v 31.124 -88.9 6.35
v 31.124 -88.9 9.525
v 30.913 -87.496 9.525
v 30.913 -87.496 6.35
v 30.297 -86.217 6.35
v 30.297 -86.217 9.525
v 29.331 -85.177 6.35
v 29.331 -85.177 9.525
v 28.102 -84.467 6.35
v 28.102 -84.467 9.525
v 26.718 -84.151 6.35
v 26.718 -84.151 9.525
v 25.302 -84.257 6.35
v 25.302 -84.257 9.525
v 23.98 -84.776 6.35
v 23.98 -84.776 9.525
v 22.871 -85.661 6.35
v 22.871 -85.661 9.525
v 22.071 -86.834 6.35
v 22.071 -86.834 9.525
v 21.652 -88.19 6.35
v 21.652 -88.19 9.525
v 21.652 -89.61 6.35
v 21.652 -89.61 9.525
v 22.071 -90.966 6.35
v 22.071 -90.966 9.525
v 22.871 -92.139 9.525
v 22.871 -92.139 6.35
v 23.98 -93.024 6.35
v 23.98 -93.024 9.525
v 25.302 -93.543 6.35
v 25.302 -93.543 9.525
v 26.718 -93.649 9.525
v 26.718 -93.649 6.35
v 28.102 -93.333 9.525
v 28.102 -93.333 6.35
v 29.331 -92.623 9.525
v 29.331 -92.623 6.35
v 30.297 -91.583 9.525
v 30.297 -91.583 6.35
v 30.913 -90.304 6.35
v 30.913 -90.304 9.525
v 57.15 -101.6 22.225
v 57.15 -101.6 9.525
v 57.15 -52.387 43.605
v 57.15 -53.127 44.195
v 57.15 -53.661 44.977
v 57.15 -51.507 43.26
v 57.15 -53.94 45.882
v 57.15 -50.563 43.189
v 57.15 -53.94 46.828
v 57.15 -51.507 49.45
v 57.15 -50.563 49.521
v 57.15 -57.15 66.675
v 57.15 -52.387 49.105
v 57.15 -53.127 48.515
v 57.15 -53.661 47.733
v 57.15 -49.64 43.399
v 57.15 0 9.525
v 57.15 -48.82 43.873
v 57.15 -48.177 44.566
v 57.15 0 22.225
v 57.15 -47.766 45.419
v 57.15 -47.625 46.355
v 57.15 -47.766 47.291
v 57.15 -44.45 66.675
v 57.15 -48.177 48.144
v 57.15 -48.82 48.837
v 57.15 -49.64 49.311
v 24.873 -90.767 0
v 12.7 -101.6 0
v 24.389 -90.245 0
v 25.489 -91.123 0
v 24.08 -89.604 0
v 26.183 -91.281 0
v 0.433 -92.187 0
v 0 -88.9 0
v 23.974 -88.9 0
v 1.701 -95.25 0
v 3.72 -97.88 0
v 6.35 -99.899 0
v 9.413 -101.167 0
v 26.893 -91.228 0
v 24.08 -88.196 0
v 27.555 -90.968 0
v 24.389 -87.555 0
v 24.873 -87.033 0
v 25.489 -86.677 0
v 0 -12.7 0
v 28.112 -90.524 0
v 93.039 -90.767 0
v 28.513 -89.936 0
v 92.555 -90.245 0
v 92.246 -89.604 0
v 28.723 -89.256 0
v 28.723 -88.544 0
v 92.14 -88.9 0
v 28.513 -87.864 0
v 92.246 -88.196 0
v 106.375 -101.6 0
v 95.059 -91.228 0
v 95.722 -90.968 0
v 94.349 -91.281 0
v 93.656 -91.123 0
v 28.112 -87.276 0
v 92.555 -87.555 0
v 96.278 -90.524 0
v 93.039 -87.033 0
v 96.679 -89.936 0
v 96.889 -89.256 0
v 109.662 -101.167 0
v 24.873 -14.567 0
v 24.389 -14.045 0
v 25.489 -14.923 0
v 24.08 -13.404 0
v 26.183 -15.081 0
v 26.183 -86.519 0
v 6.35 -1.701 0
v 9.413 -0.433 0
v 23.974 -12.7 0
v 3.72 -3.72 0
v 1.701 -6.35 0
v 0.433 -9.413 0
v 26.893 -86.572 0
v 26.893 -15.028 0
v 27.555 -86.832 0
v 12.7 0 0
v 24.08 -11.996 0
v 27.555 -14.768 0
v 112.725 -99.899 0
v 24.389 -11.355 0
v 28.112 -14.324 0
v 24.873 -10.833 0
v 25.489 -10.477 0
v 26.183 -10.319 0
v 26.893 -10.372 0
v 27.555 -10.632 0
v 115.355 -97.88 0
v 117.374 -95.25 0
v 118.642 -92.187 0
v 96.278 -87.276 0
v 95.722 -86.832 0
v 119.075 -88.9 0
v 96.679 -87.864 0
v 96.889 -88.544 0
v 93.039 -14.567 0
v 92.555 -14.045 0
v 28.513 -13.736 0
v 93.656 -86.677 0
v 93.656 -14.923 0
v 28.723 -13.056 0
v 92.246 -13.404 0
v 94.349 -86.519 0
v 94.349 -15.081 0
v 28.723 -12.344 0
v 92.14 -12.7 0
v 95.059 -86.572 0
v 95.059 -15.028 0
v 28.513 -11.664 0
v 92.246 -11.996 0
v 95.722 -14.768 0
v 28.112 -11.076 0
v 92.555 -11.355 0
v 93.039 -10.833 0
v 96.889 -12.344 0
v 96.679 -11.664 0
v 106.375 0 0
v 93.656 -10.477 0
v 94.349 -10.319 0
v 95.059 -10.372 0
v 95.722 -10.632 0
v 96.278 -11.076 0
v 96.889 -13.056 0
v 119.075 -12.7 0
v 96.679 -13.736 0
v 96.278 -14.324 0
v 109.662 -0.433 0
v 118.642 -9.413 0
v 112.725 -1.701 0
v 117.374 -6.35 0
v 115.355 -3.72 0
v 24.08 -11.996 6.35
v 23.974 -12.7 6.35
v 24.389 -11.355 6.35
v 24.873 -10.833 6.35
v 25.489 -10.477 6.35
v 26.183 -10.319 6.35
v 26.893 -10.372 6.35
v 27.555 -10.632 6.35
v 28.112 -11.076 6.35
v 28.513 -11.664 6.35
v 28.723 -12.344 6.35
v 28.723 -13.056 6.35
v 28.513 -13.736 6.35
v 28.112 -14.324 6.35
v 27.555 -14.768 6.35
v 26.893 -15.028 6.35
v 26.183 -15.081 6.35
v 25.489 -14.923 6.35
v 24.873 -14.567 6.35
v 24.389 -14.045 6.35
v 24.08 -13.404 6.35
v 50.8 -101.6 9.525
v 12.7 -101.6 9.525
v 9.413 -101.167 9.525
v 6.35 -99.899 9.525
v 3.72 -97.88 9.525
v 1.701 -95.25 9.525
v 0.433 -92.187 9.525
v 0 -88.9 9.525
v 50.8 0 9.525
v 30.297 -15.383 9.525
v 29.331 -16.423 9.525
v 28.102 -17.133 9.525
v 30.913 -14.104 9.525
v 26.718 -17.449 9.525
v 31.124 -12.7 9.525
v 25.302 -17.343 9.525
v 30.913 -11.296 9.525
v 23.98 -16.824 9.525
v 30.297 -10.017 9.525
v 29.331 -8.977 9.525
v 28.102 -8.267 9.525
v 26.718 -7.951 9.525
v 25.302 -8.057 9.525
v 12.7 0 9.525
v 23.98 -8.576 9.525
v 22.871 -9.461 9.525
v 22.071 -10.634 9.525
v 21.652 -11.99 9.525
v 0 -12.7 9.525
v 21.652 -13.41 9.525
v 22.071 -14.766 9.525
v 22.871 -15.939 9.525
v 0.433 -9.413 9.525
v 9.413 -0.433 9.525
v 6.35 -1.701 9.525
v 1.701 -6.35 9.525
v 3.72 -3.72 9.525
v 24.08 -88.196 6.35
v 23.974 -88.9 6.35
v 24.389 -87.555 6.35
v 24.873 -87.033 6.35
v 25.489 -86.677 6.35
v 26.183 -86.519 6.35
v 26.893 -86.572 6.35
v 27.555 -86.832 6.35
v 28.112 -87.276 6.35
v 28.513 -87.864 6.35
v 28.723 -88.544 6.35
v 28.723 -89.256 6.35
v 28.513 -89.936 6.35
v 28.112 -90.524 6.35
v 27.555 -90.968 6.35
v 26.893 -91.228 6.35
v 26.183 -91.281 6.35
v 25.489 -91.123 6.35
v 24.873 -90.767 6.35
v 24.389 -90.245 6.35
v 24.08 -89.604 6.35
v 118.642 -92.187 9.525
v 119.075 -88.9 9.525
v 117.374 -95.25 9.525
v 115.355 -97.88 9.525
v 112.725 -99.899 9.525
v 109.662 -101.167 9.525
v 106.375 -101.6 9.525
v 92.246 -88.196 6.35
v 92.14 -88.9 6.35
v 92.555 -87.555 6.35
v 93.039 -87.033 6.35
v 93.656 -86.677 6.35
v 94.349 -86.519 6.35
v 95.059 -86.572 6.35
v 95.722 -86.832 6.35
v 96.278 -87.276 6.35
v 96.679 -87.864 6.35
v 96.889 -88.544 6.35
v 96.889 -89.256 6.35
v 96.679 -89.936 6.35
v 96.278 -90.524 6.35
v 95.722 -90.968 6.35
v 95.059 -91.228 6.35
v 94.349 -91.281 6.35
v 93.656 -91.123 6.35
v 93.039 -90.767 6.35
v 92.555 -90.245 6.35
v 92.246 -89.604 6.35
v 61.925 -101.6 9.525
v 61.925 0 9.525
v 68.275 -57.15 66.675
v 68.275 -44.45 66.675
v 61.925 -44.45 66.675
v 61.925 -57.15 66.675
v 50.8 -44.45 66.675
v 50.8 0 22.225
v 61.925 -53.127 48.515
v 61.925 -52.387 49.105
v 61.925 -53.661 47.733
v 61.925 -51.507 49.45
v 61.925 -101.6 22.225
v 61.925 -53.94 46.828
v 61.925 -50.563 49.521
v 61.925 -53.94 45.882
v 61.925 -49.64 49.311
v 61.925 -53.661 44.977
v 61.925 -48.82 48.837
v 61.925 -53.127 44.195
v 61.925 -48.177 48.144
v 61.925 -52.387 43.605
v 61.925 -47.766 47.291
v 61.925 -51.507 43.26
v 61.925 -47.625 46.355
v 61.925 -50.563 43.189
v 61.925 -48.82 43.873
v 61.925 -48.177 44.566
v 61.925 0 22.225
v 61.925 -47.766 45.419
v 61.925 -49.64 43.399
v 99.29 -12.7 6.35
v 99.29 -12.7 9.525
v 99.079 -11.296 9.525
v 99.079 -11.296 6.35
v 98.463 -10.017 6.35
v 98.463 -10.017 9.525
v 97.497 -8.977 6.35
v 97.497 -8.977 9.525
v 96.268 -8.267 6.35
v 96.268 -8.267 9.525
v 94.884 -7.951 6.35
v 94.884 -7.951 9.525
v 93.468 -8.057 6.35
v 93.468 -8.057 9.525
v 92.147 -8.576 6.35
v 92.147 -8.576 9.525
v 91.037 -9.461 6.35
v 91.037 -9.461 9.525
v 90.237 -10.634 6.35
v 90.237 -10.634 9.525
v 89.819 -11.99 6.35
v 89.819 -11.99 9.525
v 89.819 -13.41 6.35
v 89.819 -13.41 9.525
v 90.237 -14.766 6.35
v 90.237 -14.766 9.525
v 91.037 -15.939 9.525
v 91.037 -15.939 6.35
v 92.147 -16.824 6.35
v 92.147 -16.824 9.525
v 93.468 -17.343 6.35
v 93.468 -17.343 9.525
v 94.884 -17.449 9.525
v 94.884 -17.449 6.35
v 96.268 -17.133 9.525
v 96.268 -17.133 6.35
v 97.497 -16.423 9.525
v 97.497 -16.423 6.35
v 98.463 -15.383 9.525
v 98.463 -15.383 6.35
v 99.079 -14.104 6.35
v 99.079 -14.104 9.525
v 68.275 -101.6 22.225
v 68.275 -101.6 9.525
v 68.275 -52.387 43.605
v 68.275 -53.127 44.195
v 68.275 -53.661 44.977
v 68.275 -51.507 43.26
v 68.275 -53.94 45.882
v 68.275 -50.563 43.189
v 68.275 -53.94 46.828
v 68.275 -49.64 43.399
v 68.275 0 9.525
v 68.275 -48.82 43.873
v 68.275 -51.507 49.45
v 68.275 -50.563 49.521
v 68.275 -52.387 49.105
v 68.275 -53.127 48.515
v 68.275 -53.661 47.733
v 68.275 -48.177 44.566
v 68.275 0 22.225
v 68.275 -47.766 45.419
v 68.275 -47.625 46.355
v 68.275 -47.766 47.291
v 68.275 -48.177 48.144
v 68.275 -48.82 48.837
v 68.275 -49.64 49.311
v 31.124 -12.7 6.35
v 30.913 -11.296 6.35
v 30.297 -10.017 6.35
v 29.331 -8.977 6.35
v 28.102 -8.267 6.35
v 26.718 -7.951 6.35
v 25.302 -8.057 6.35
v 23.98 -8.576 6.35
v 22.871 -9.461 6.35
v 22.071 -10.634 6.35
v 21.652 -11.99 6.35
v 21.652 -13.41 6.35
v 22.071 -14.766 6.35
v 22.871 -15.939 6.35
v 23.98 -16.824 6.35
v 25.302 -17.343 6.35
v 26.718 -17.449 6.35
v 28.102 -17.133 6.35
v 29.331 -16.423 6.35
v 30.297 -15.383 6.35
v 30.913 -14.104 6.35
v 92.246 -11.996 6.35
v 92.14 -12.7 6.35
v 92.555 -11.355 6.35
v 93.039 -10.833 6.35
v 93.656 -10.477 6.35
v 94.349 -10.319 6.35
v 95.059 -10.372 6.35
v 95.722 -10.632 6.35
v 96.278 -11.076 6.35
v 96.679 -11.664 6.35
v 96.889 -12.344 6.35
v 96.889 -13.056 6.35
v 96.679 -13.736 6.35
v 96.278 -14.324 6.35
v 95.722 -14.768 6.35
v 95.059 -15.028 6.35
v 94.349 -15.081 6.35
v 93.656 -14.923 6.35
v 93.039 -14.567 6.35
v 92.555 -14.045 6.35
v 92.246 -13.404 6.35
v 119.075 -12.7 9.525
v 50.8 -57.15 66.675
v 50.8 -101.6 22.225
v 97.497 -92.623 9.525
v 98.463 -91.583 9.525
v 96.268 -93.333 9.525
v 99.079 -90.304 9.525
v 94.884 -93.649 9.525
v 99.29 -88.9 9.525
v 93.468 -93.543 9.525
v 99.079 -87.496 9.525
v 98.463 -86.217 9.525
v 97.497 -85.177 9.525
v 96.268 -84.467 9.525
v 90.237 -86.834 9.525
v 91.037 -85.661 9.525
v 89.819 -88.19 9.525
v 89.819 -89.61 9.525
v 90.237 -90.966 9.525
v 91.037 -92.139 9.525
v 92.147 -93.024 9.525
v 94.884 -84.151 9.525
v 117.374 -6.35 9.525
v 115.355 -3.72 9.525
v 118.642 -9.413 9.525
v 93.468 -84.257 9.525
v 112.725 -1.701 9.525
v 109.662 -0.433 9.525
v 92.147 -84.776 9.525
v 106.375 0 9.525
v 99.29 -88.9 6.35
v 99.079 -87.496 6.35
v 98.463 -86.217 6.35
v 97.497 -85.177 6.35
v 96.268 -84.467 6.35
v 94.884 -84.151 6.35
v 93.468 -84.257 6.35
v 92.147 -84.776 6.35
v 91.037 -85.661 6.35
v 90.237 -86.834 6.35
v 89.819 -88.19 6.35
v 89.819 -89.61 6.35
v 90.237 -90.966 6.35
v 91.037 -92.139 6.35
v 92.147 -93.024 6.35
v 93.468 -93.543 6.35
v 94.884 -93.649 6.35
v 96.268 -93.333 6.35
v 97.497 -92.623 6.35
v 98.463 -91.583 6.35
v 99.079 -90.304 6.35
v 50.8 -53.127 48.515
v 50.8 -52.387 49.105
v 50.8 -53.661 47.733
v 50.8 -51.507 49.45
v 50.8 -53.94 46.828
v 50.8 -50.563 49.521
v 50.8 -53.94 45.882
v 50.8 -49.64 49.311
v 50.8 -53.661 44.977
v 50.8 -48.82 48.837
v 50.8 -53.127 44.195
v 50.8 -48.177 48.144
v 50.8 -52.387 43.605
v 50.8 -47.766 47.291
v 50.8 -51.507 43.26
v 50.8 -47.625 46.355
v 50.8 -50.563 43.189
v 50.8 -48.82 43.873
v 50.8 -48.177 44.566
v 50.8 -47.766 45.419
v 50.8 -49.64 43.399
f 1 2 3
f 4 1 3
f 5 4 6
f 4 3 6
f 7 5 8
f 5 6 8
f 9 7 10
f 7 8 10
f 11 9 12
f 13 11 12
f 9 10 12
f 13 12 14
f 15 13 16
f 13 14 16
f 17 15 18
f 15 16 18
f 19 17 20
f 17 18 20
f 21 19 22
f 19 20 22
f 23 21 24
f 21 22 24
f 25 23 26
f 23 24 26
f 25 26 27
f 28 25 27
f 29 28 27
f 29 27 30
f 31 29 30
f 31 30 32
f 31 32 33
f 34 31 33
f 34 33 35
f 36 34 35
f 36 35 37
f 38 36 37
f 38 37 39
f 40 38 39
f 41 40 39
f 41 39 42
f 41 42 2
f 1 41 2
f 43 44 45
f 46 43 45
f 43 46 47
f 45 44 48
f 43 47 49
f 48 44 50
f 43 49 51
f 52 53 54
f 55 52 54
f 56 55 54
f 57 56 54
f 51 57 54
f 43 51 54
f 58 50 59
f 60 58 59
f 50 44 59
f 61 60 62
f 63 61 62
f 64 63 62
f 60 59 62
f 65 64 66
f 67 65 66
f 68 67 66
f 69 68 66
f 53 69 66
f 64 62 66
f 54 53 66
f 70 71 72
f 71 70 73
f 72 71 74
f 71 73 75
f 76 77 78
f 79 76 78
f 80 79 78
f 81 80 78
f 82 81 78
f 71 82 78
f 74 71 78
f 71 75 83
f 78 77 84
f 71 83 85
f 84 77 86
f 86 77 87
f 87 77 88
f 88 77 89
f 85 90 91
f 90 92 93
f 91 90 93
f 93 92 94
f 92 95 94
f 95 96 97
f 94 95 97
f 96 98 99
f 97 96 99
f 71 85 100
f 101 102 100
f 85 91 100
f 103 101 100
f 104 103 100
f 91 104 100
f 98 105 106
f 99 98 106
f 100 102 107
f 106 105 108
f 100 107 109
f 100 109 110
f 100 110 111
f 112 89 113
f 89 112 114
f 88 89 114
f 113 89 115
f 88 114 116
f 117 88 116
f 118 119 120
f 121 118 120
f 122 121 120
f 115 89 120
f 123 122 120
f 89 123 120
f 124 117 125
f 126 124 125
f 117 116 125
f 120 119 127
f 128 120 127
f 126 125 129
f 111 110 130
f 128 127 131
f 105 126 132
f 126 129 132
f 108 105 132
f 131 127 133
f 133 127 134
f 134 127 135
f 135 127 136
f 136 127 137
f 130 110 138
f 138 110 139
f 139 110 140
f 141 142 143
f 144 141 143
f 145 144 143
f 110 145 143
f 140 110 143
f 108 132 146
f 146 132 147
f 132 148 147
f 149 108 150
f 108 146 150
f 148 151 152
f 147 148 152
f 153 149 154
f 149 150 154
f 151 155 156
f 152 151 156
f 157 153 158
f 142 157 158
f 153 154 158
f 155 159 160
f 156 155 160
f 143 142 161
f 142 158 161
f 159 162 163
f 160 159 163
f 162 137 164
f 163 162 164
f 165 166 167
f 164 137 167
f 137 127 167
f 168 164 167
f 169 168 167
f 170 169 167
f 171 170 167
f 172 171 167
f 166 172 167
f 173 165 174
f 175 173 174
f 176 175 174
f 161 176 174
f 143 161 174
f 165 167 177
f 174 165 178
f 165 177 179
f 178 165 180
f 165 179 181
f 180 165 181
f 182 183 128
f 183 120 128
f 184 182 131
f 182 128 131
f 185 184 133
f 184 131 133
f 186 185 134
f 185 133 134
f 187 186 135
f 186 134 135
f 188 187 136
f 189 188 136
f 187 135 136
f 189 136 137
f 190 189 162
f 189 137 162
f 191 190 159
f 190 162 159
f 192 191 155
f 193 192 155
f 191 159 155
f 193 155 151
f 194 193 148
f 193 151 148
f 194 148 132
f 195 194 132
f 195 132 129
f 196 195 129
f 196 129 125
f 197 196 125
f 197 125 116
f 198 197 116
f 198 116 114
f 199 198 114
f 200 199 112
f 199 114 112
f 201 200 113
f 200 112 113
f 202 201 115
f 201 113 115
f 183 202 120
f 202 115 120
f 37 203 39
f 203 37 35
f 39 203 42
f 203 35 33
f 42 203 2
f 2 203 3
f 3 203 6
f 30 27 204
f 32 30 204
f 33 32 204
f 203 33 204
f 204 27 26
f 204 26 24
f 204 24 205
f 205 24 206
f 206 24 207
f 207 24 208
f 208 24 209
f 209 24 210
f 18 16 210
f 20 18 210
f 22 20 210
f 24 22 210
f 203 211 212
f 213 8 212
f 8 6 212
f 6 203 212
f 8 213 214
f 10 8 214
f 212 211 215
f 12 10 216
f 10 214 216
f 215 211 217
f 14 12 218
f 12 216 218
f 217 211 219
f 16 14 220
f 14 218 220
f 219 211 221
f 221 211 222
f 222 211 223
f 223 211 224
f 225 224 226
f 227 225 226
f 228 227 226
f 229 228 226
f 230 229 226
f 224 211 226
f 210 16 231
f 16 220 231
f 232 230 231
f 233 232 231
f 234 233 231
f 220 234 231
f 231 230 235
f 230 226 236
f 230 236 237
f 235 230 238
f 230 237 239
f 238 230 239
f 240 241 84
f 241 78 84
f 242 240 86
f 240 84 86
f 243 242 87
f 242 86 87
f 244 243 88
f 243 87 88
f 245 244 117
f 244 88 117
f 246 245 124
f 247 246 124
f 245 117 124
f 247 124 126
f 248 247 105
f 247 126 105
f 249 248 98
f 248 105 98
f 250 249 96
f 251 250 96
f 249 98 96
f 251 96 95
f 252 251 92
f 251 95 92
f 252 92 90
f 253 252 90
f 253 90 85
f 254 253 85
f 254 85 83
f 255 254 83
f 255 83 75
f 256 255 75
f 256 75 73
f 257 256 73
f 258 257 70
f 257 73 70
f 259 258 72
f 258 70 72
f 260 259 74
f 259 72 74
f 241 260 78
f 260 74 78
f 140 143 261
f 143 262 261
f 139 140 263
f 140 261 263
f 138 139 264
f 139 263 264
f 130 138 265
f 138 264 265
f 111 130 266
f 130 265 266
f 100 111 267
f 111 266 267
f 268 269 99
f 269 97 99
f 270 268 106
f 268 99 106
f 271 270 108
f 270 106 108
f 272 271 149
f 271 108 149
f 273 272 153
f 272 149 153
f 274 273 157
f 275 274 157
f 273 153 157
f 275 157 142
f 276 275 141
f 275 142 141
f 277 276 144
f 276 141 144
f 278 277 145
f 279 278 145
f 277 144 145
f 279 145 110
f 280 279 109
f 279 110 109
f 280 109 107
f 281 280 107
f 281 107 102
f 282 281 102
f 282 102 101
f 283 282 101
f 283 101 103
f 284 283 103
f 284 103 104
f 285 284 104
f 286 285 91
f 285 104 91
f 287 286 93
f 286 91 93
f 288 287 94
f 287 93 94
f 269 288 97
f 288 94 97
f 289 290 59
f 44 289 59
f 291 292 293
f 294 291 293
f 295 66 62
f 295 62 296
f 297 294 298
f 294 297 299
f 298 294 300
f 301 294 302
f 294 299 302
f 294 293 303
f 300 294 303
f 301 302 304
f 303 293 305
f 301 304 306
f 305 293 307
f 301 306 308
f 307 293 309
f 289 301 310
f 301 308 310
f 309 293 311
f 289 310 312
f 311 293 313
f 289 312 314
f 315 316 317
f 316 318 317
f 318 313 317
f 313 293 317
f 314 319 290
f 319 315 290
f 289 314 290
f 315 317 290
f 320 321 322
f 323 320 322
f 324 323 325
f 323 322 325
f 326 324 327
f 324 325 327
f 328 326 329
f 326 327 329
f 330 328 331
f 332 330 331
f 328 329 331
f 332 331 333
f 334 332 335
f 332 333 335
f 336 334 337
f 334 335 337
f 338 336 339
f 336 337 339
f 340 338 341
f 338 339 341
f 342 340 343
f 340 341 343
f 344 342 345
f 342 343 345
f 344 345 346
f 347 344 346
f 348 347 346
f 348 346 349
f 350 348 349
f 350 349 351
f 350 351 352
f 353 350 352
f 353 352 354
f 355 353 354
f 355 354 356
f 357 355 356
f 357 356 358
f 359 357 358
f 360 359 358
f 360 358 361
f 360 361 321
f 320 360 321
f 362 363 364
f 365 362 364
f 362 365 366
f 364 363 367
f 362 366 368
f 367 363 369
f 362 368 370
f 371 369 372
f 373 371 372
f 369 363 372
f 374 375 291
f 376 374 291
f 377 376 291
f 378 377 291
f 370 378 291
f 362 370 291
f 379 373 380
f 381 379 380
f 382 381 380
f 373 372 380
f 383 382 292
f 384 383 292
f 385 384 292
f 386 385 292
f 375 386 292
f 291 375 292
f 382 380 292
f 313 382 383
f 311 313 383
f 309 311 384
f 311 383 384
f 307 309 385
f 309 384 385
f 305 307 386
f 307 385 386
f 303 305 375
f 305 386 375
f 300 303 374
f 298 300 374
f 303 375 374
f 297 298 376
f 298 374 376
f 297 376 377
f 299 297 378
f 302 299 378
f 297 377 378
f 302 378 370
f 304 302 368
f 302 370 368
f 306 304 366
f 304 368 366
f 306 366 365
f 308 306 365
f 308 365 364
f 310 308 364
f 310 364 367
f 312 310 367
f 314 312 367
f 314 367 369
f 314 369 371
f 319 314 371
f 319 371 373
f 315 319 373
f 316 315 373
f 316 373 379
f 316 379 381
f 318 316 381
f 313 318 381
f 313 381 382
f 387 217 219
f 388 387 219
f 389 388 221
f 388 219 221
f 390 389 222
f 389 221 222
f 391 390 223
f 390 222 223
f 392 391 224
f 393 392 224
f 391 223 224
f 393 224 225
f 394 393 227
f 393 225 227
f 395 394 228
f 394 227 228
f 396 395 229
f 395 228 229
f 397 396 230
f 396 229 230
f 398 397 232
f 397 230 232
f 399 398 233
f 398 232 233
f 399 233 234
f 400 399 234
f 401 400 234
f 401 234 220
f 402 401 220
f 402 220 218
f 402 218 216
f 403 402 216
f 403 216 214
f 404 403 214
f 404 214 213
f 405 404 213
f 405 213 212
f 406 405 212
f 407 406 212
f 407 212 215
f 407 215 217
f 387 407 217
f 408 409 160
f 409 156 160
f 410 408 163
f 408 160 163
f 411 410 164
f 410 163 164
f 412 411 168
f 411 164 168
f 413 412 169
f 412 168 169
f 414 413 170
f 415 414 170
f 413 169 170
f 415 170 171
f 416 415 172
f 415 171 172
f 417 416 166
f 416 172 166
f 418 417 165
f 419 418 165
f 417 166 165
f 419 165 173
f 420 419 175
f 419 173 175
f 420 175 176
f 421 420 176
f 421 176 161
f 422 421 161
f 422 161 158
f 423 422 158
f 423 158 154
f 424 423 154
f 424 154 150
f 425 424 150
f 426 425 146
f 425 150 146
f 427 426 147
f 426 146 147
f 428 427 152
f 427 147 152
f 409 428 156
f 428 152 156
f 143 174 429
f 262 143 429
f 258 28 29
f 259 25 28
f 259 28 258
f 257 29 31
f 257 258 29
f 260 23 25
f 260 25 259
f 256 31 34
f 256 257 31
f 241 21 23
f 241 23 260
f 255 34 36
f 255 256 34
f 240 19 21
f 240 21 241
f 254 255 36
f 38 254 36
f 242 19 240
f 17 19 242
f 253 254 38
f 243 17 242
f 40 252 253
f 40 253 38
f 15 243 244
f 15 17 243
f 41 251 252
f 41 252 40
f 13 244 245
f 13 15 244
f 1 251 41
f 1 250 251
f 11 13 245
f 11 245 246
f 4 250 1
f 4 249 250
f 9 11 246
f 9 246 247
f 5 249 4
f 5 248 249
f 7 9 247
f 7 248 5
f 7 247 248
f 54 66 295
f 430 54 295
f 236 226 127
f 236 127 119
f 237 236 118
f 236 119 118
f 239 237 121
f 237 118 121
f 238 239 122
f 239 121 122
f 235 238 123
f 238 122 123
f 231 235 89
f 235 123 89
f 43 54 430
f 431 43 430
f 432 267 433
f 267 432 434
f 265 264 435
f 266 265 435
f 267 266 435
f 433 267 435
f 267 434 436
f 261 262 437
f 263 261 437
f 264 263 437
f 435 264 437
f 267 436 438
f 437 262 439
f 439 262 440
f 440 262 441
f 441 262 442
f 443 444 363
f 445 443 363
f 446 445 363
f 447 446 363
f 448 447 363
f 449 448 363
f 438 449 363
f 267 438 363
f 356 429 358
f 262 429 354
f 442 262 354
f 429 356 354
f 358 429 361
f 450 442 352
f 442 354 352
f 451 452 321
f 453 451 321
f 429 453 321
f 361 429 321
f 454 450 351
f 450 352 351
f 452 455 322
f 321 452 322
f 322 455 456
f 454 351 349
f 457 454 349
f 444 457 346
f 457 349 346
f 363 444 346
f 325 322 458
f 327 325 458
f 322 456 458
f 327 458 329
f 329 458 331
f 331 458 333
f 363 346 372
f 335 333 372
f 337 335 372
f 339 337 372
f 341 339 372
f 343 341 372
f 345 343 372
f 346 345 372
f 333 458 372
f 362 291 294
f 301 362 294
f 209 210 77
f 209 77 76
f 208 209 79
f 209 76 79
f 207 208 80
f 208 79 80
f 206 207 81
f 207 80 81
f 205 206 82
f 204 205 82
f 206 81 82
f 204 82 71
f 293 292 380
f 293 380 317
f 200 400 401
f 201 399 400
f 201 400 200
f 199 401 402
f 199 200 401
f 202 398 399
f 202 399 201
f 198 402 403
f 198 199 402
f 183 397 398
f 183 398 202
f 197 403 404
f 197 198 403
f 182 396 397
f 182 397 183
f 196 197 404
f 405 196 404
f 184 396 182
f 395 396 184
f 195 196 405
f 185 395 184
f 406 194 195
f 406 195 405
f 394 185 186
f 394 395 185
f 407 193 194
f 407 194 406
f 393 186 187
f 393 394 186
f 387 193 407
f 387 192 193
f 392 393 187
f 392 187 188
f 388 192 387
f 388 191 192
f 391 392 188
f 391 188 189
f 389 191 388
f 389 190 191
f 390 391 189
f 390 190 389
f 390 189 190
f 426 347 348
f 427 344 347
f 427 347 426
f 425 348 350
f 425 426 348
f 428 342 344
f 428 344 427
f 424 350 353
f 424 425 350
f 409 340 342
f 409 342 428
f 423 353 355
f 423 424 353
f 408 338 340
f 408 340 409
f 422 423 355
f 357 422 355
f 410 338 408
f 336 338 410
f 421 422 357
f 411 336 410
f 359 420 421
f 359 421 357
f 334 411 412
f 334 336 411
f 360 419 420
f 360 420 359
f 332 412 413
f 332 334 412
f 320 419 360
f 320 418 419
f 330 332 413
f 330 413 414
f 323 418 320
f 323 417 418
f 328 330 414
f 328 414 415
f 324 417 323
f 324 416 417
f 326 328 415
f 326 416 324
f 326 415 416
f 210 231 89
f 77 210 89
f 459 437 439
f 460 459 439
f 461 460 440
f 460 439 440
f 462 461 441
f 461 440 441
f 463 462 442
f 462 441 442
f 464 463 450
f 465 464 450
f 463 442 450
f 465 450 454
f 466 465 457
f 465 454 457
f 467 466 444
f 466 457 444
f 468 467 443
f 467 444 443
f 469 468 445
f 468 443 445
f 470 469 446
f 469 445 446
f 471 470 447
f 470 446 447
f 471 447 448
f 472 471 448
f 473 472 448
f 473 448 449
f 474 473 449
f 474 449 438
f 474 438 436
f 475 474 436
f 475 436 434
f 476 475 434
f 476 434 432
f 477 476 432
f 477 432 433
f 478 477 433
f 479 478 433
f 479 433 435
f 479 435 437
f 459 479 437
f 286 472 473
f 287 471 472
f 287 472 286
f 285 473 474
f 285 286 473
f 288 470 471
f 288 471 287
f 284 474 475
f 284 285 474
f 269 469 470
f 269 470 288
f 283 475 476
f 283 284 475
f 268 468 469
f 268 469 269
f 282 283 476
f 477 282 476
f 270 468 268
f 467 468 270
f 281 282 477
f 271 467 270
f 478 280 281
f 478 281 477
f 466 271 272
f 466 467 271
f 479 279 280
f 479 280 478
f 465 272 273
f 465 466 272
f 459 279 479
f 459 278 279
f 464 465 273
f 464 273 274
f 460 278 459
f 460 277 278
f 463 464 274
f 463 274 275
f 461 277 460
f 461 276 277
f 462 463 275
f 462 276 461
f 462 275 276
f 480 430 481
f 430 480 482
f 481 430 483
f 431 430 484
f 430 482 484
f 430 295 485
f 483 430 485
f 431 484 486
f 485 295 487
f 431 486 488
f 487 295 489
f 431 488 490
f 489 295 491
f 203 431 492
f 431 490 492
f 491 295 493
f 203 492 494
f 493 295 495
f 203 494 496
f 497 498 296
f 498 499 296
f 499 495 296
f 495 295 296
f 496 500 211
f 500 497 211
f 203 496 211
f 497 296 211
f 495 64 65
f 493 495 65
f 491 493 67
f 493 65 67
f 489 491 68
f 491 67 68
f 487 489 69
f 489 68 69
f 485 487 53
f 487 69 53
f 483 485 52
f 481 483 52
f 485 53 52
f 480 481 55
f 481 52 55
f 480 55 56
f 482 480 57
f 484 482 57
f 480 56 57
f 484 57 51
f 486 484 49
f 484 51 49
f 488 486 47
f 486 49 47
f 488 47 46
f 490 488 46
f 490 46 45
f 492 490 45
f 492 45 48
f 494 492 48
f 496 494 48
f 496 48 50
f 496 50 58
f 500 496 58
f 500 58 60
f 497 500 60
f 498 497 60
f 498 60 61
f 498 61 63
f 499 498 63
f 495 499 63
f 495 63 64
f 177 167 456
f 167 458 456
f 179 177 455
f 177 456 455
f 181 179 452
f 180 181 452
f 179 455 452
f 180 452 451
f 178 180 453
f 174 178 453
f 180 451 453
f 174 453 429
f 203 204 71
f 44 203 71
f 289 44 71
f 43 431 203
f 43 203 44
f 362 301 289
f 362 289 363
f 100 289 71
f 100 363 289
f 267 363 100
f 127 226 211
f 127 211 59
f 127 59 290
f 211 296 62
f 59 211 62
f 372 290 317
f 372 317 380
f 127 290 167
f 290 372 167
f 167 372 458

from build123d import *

# Parameters (mm, degrees)
F1_DEPTH       = 101.6
F3_D           = 4.7752
F3_CBORE_D     = 9.525
F3_CBORE_DEPTH = 3.175
F5_D           = 4.7752
F5_CBORE_D     = 9.525
F5_CBORE_DEPTH = 3.175
F7_D           = 6.35
F8_SIZE        = 44.45
F9_R           = 12.7


with BuildPart() as f1:
    # F0 (on Front) → F1 (new body)
    with BuildSketch(Plane.XZ):
        Polygon((0, 9.525), (0, 0), (119.0752, 0), (119.0752, 9.525), (68.2752, 9.525), (68.2752, 66.675), (61.9252, 66.675), (61.9252, 9.525), (57.15, 9.525), (57.15, 66.675), (50.8, 66.675), (50.8, 9.525), align=None)
    extrude(amount=F1_DEPTH)

    # F3 (through all)
    with Locations(Plane.XY.offset(9.525)):
        with Locations((26.361667, -12.7), (26.361667, -88.9)):
            CounterBoreHole(F3_D / 2, F3_CBORE_D / 2, F3_CBORE_DEPTH)

    # F5 (through all)
    with Locations(Plane.XY.offset(9.525)):
        with Locations((94.527818, -12.7), (94.527818, -88.9)):
            CounterBoreHole(F5_D / 2, F5_CBORE_D / 2, F5_CBORE_DEPTH)

    # F7 (through all)
    with Locations(Plane(origin=(50.8, 0, 0), x_dir=(0, -1, 0), z_dir=(-1, 0, 0))):
        with Locations((50.8, 46.355)):
            Hole(F7_D / 2)

    # F8
    f8_edges = [f1.edges().sort_by_distance(p)[0] for p in [
        (53.975, 0, 66.675),
        (53.975, -101.6, 66.675),
        (65.1002, 0, 66.675),
        (65.1002, -101.6, 66.675),
    ]]
    chamfer(f8_edges, length=F8_SIZE)

    # F9
    f9_edges = [f1.edges().sort_by_distance(p)[0] for p in [
        (0, 0, 4.7625),
        (0, -101.6, 4.7625),
        (119.0752, -101.6, 4.7625),
        (119.0752, 0, 4.7625),
    ]]
    fillet(f9_edges, radius=F9_R)


solid = f1.part
